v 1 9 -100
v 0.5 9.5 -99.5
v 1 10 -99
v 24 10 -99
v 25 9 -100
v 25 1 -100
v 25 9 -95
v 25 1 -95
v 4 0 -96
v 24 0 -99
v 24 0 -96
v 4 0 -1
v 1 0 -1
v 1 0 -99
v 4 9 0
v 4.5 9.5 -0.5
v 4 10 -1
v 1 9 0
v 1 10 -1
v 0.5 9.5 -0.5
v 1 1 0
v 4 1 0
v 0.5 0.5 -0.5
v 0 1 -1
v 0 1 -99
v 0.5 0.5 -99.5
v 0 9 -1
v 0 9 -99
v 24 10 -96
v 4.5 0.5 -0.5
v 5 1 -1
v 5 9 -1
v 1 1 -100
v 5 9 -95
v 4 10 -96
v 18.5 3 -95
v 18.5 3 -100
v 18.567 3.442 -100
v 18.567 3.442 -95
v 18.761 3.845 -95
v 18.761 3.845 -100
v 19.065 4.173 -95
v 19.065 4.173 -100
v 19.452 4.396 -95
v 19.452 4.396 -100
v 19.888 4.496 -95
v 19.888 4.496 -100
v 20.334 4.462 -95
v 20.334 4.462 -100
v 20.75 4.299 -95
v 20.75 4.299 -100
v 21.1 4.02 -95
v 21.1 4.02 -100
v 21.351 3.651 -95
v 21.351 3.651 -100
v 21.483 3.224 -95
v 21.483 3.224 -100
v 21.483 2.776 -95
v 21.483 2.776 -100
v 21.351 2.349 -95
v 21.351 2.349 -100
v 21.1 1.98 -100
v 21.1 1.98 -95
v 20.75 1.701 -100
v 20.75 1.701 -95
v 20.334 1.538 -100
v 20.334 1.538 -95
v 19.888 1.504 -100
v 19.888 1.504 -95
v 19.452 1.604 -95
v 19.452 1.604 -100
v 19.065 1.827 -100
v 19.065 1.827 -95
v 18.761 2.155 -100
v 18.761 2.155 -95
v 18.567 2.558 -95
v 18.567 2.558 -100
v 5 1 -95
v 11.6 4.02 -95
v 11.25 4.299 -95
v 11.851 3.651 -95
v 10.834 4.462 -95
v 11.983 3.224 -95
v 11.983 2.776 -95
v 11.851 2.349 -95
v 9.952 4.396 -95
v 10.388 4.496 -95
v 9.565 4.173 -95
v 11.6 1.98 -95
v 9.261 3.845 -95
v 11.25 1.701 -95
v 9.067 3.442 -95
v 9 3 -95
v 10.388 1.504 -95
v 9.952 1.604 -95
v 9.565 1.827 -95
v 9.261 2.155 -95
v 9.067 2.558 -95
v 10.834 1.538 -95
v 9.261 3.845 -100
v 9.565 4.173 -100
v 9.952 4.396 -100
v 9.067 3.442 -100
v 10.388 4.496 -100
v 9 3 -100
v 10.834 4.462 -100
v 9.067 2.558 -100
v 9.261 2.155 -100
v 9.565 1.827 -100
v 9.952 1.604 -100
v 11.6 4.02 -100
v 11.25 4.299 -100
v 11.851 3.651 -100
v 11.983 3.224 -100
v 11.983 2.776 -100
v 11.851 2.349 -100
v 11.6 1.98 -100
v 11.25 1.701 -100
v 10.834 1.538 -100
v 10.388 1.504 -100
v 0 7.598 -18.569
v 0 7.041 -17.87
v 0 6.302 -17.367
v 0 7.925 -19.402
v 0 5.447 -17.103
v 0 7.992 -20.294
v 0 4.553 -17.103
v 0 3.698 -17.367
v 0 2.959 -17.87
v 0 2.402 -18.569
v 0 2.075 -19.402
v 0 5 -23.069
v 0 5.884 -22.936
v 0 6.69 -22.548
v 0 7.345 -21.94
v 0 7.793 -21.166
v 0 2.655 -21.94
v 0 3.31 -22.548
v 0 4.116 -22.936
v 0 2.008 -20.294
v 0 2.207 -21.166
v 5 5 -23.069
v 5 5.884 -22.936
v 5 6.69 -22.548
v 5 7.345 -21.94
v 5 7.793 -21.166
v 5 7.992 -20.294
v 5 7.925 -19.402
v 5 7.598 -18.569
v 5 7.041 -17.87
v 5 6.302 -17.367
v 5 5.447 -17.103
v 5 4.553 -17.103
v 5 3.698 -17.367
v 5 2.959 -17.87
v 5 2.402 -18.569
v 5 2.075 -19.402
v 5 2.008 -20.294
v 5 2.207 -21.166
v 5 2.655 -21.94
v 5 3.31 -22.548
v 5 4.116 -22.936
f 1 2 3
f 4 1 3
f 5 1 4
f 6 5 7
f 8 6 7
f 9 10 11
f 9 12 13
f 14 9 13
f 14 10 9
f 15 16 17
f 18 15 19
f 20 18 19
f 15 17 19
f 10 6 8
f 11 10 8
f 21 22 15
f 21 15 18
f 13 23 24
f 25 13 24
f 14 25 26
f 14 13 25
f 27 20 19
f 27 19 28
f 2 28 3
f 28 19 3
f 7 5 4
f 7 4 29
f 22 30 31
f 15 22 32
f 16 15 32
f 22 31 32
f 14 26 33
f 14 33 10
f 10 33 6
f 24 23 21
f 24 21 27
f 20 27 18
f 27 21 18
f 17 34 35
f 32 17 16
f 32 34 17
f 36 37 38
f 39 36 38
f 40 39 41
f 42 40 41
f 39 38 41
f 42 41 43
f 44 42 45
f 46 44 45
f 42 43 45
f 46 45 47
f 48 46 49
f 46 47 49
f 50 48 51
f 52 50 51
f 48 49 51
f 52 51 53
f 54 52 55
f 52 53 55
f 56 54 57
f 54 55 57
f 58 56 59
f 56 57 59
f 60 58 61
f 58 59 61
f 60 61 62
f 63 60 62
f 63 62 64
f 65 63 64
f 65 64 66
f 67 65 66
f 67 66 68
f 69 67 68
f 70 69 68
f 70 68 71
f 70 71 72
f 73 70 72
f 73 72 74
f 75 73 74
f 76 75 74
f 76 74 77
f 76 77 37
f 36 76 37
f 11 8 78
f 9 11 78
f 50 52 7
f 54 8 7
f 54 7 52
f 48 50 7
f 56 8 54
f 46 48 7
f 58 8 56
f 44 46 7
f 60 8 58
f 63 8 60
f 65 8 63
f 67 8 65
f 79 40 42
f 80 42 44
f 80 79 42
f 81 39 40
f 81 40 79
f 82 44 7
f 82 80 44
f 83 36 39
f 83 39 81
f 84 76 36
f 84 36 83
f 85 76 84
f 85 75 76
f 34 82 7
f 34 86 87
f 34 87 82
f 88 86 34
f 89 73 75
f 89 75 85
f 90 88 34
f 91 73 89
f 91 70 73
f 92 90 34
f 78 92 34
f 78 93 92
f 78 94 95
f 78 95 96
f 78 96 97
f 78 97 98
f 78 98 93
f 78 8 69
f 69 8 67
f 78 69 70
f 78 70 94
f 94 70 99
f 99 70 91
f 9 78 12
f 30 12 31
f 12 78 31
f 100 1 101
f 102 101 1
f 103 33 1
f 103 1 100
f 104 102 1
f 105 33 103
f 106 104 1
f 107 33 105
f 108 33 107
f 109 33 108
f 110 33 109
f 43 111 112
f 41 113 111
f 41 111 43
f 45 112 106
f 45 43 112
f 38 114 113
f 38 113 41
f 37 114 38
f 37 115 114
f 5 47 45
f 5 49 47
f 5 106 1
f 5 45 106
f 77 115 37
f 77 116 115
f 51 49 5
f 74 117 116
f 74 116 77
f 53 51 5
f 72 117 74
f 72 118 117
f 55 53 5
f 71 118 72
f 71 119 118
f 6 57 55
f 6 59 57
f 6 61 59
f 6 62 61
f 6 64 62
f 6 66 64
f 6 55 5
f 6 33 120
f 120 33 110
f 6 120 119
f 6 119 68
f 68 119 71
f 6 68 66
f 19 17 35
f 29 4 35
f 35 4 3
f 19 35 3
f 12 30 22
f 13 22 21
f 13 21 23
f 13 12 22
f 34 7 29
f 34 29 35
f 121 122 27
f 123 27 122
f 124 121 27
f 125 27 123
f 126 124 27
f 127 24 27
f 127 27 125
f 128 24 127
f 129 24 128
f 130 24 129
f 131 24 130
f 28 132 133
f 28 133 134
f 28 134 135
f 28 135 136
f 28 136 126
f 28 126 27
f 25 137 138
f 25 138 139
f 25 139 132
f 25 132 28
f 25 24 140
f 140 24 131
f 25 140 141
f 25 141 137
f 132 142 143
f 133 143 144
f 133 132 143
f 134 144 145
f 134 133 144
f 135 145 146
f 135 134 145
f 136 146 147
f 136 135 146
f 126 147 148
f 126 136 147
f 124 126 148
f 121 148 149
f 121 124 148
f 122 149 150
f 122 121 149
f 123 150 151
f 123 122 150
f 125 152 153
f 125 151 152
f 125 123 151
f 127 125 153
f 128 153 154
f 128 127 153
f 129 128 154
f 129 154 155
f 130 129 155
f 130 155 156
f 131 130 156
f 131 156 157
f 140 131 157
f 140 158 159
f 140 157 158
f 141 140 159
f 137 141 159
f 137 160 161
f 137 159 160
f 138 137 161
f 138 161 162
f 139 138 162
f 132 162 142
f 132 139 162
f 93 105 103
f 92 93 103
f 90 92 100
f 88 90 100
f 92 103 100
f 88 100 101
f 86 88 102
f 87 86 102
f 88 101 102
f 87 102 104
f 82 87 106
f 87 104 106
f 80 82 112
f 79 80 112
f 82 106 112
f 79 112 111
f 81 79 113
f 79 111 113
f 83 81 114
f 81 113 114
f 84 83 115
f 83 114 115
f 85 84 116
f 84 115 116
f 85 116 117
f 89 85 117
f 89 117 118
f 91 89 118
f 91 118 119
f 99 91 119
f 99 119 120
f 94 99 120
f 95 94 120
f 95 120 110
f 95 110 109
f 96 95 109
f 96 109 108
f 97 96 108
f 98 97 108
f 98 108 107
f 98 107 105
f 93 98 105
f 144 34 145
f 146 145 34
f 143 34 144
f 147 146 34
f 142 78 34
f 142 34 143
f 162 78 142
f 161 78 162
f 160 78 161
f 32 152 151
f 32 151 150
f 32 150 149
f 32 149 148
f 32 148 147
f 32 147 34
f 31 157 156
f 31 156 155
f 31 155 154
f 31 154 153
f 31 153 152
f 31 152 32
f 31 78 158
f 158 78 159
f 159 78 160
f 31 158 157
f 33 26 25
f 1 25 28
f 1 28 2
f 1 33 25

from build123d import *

# Parameters (mm, degrees)
BOSS_EXTRUDE1_DEPTH = 10
SKETCH2_R           = 3
CUT_EXTRUDE1_DEPTH  = 10
SKETCH3_R           = 1.5
CUT_EXTRUDE2_DEPTH  = 20
CHAMFER1_SIZE       = 1
CHAMFER2_SIZE       = 1
CHAMFER3_SIZE       = 1
CHAMFER4_SIZE       = 1


with BuildPart() as part:
    # Sketch1 → Boss-Extrude1 (new body)
    with BuildSketch(Plane(origin=(0, 0, 0), x_dir=(1, 0, 0), z_dir=(0, 1, 0))):
        Polygon((0, 0), (0, 100), (25, 100), (25, 95), (5, 95), (5, 0), align=None)
    extrude(amount=BOSS_EXTRUDE1_DEPTH)

    # Sketch2 → Cut-Extrude1 (cut)
    with BuildSketch(Plane(origin=(0, 0, 0), x_dir=(0, 0, -1), z_dir=(1, 0, 0))):
        with Locations((20.069491085, 5)):
            Circle(SKETCH2_R)
    extrude(amount=CUT_EXTRUDE1_DEPTH, mode=Mode.SUBTRACT)

    # Sketch3 → Cut-Extrude2 (cut)
    with BuildSketch(Plane(origin=(0, 0, -100), x_dir=(-1, 0, 0), z_dir=(0, 0, -1))):
        with Locations((-20, 3)):
            Circle(SKETCH3_R)
        with Locations((-10.5, 3)):
            Circle(SKETCH3_R)
    extrude(amount=-CUT_EXTRUDE2_DEPTH, mode=Mode.SUBTRACT)

    # Chamfer1
    chamfer1_edges = [part.edges().sort_by_distance(p)[0] for p in [
        (15, 10, -95),
        (25, 10, -97.5),
        (12.5, 10, -100),
        (0, 10, -50),
        (2.5, 10, 0),
        (5, 10, -47.5),
    ]]
    chamfer(chamfer1_edges, length=CHAMFER1_SIZE)

    # Chamfer2
    chamfer2_edges = [part.edges().sort_by_distance(p)[0] for p in [
        (0, 0, -50),
        (12.5, 0, -100),
        (25, 0, -97.5),
        (15, 0, -95),
        (5, 0, -47.5),
        (2.5, 0, 0),
    ]]
    chamfer(chamfer2_edges, length=CHAMFER2_SIZE)

    # Chamfer3
    chamfer3_edges = [part.edges().sort_by_distance(p)[0] for p in [
        (0, 5, -100),
    ]]
    chamfer(chamfer3_edges, length=CHAMFER3_SIZE)

    # Chamfer4
    chamfer4_edges = [part.edges().sort_by_distance(p)[0] for p in [
        (0, 5, 0),
        (5, 5, 0),
    ]]
    chamfer(chamfer4_edges, length=CHAMFER4_SIZE)


solid = part.part
